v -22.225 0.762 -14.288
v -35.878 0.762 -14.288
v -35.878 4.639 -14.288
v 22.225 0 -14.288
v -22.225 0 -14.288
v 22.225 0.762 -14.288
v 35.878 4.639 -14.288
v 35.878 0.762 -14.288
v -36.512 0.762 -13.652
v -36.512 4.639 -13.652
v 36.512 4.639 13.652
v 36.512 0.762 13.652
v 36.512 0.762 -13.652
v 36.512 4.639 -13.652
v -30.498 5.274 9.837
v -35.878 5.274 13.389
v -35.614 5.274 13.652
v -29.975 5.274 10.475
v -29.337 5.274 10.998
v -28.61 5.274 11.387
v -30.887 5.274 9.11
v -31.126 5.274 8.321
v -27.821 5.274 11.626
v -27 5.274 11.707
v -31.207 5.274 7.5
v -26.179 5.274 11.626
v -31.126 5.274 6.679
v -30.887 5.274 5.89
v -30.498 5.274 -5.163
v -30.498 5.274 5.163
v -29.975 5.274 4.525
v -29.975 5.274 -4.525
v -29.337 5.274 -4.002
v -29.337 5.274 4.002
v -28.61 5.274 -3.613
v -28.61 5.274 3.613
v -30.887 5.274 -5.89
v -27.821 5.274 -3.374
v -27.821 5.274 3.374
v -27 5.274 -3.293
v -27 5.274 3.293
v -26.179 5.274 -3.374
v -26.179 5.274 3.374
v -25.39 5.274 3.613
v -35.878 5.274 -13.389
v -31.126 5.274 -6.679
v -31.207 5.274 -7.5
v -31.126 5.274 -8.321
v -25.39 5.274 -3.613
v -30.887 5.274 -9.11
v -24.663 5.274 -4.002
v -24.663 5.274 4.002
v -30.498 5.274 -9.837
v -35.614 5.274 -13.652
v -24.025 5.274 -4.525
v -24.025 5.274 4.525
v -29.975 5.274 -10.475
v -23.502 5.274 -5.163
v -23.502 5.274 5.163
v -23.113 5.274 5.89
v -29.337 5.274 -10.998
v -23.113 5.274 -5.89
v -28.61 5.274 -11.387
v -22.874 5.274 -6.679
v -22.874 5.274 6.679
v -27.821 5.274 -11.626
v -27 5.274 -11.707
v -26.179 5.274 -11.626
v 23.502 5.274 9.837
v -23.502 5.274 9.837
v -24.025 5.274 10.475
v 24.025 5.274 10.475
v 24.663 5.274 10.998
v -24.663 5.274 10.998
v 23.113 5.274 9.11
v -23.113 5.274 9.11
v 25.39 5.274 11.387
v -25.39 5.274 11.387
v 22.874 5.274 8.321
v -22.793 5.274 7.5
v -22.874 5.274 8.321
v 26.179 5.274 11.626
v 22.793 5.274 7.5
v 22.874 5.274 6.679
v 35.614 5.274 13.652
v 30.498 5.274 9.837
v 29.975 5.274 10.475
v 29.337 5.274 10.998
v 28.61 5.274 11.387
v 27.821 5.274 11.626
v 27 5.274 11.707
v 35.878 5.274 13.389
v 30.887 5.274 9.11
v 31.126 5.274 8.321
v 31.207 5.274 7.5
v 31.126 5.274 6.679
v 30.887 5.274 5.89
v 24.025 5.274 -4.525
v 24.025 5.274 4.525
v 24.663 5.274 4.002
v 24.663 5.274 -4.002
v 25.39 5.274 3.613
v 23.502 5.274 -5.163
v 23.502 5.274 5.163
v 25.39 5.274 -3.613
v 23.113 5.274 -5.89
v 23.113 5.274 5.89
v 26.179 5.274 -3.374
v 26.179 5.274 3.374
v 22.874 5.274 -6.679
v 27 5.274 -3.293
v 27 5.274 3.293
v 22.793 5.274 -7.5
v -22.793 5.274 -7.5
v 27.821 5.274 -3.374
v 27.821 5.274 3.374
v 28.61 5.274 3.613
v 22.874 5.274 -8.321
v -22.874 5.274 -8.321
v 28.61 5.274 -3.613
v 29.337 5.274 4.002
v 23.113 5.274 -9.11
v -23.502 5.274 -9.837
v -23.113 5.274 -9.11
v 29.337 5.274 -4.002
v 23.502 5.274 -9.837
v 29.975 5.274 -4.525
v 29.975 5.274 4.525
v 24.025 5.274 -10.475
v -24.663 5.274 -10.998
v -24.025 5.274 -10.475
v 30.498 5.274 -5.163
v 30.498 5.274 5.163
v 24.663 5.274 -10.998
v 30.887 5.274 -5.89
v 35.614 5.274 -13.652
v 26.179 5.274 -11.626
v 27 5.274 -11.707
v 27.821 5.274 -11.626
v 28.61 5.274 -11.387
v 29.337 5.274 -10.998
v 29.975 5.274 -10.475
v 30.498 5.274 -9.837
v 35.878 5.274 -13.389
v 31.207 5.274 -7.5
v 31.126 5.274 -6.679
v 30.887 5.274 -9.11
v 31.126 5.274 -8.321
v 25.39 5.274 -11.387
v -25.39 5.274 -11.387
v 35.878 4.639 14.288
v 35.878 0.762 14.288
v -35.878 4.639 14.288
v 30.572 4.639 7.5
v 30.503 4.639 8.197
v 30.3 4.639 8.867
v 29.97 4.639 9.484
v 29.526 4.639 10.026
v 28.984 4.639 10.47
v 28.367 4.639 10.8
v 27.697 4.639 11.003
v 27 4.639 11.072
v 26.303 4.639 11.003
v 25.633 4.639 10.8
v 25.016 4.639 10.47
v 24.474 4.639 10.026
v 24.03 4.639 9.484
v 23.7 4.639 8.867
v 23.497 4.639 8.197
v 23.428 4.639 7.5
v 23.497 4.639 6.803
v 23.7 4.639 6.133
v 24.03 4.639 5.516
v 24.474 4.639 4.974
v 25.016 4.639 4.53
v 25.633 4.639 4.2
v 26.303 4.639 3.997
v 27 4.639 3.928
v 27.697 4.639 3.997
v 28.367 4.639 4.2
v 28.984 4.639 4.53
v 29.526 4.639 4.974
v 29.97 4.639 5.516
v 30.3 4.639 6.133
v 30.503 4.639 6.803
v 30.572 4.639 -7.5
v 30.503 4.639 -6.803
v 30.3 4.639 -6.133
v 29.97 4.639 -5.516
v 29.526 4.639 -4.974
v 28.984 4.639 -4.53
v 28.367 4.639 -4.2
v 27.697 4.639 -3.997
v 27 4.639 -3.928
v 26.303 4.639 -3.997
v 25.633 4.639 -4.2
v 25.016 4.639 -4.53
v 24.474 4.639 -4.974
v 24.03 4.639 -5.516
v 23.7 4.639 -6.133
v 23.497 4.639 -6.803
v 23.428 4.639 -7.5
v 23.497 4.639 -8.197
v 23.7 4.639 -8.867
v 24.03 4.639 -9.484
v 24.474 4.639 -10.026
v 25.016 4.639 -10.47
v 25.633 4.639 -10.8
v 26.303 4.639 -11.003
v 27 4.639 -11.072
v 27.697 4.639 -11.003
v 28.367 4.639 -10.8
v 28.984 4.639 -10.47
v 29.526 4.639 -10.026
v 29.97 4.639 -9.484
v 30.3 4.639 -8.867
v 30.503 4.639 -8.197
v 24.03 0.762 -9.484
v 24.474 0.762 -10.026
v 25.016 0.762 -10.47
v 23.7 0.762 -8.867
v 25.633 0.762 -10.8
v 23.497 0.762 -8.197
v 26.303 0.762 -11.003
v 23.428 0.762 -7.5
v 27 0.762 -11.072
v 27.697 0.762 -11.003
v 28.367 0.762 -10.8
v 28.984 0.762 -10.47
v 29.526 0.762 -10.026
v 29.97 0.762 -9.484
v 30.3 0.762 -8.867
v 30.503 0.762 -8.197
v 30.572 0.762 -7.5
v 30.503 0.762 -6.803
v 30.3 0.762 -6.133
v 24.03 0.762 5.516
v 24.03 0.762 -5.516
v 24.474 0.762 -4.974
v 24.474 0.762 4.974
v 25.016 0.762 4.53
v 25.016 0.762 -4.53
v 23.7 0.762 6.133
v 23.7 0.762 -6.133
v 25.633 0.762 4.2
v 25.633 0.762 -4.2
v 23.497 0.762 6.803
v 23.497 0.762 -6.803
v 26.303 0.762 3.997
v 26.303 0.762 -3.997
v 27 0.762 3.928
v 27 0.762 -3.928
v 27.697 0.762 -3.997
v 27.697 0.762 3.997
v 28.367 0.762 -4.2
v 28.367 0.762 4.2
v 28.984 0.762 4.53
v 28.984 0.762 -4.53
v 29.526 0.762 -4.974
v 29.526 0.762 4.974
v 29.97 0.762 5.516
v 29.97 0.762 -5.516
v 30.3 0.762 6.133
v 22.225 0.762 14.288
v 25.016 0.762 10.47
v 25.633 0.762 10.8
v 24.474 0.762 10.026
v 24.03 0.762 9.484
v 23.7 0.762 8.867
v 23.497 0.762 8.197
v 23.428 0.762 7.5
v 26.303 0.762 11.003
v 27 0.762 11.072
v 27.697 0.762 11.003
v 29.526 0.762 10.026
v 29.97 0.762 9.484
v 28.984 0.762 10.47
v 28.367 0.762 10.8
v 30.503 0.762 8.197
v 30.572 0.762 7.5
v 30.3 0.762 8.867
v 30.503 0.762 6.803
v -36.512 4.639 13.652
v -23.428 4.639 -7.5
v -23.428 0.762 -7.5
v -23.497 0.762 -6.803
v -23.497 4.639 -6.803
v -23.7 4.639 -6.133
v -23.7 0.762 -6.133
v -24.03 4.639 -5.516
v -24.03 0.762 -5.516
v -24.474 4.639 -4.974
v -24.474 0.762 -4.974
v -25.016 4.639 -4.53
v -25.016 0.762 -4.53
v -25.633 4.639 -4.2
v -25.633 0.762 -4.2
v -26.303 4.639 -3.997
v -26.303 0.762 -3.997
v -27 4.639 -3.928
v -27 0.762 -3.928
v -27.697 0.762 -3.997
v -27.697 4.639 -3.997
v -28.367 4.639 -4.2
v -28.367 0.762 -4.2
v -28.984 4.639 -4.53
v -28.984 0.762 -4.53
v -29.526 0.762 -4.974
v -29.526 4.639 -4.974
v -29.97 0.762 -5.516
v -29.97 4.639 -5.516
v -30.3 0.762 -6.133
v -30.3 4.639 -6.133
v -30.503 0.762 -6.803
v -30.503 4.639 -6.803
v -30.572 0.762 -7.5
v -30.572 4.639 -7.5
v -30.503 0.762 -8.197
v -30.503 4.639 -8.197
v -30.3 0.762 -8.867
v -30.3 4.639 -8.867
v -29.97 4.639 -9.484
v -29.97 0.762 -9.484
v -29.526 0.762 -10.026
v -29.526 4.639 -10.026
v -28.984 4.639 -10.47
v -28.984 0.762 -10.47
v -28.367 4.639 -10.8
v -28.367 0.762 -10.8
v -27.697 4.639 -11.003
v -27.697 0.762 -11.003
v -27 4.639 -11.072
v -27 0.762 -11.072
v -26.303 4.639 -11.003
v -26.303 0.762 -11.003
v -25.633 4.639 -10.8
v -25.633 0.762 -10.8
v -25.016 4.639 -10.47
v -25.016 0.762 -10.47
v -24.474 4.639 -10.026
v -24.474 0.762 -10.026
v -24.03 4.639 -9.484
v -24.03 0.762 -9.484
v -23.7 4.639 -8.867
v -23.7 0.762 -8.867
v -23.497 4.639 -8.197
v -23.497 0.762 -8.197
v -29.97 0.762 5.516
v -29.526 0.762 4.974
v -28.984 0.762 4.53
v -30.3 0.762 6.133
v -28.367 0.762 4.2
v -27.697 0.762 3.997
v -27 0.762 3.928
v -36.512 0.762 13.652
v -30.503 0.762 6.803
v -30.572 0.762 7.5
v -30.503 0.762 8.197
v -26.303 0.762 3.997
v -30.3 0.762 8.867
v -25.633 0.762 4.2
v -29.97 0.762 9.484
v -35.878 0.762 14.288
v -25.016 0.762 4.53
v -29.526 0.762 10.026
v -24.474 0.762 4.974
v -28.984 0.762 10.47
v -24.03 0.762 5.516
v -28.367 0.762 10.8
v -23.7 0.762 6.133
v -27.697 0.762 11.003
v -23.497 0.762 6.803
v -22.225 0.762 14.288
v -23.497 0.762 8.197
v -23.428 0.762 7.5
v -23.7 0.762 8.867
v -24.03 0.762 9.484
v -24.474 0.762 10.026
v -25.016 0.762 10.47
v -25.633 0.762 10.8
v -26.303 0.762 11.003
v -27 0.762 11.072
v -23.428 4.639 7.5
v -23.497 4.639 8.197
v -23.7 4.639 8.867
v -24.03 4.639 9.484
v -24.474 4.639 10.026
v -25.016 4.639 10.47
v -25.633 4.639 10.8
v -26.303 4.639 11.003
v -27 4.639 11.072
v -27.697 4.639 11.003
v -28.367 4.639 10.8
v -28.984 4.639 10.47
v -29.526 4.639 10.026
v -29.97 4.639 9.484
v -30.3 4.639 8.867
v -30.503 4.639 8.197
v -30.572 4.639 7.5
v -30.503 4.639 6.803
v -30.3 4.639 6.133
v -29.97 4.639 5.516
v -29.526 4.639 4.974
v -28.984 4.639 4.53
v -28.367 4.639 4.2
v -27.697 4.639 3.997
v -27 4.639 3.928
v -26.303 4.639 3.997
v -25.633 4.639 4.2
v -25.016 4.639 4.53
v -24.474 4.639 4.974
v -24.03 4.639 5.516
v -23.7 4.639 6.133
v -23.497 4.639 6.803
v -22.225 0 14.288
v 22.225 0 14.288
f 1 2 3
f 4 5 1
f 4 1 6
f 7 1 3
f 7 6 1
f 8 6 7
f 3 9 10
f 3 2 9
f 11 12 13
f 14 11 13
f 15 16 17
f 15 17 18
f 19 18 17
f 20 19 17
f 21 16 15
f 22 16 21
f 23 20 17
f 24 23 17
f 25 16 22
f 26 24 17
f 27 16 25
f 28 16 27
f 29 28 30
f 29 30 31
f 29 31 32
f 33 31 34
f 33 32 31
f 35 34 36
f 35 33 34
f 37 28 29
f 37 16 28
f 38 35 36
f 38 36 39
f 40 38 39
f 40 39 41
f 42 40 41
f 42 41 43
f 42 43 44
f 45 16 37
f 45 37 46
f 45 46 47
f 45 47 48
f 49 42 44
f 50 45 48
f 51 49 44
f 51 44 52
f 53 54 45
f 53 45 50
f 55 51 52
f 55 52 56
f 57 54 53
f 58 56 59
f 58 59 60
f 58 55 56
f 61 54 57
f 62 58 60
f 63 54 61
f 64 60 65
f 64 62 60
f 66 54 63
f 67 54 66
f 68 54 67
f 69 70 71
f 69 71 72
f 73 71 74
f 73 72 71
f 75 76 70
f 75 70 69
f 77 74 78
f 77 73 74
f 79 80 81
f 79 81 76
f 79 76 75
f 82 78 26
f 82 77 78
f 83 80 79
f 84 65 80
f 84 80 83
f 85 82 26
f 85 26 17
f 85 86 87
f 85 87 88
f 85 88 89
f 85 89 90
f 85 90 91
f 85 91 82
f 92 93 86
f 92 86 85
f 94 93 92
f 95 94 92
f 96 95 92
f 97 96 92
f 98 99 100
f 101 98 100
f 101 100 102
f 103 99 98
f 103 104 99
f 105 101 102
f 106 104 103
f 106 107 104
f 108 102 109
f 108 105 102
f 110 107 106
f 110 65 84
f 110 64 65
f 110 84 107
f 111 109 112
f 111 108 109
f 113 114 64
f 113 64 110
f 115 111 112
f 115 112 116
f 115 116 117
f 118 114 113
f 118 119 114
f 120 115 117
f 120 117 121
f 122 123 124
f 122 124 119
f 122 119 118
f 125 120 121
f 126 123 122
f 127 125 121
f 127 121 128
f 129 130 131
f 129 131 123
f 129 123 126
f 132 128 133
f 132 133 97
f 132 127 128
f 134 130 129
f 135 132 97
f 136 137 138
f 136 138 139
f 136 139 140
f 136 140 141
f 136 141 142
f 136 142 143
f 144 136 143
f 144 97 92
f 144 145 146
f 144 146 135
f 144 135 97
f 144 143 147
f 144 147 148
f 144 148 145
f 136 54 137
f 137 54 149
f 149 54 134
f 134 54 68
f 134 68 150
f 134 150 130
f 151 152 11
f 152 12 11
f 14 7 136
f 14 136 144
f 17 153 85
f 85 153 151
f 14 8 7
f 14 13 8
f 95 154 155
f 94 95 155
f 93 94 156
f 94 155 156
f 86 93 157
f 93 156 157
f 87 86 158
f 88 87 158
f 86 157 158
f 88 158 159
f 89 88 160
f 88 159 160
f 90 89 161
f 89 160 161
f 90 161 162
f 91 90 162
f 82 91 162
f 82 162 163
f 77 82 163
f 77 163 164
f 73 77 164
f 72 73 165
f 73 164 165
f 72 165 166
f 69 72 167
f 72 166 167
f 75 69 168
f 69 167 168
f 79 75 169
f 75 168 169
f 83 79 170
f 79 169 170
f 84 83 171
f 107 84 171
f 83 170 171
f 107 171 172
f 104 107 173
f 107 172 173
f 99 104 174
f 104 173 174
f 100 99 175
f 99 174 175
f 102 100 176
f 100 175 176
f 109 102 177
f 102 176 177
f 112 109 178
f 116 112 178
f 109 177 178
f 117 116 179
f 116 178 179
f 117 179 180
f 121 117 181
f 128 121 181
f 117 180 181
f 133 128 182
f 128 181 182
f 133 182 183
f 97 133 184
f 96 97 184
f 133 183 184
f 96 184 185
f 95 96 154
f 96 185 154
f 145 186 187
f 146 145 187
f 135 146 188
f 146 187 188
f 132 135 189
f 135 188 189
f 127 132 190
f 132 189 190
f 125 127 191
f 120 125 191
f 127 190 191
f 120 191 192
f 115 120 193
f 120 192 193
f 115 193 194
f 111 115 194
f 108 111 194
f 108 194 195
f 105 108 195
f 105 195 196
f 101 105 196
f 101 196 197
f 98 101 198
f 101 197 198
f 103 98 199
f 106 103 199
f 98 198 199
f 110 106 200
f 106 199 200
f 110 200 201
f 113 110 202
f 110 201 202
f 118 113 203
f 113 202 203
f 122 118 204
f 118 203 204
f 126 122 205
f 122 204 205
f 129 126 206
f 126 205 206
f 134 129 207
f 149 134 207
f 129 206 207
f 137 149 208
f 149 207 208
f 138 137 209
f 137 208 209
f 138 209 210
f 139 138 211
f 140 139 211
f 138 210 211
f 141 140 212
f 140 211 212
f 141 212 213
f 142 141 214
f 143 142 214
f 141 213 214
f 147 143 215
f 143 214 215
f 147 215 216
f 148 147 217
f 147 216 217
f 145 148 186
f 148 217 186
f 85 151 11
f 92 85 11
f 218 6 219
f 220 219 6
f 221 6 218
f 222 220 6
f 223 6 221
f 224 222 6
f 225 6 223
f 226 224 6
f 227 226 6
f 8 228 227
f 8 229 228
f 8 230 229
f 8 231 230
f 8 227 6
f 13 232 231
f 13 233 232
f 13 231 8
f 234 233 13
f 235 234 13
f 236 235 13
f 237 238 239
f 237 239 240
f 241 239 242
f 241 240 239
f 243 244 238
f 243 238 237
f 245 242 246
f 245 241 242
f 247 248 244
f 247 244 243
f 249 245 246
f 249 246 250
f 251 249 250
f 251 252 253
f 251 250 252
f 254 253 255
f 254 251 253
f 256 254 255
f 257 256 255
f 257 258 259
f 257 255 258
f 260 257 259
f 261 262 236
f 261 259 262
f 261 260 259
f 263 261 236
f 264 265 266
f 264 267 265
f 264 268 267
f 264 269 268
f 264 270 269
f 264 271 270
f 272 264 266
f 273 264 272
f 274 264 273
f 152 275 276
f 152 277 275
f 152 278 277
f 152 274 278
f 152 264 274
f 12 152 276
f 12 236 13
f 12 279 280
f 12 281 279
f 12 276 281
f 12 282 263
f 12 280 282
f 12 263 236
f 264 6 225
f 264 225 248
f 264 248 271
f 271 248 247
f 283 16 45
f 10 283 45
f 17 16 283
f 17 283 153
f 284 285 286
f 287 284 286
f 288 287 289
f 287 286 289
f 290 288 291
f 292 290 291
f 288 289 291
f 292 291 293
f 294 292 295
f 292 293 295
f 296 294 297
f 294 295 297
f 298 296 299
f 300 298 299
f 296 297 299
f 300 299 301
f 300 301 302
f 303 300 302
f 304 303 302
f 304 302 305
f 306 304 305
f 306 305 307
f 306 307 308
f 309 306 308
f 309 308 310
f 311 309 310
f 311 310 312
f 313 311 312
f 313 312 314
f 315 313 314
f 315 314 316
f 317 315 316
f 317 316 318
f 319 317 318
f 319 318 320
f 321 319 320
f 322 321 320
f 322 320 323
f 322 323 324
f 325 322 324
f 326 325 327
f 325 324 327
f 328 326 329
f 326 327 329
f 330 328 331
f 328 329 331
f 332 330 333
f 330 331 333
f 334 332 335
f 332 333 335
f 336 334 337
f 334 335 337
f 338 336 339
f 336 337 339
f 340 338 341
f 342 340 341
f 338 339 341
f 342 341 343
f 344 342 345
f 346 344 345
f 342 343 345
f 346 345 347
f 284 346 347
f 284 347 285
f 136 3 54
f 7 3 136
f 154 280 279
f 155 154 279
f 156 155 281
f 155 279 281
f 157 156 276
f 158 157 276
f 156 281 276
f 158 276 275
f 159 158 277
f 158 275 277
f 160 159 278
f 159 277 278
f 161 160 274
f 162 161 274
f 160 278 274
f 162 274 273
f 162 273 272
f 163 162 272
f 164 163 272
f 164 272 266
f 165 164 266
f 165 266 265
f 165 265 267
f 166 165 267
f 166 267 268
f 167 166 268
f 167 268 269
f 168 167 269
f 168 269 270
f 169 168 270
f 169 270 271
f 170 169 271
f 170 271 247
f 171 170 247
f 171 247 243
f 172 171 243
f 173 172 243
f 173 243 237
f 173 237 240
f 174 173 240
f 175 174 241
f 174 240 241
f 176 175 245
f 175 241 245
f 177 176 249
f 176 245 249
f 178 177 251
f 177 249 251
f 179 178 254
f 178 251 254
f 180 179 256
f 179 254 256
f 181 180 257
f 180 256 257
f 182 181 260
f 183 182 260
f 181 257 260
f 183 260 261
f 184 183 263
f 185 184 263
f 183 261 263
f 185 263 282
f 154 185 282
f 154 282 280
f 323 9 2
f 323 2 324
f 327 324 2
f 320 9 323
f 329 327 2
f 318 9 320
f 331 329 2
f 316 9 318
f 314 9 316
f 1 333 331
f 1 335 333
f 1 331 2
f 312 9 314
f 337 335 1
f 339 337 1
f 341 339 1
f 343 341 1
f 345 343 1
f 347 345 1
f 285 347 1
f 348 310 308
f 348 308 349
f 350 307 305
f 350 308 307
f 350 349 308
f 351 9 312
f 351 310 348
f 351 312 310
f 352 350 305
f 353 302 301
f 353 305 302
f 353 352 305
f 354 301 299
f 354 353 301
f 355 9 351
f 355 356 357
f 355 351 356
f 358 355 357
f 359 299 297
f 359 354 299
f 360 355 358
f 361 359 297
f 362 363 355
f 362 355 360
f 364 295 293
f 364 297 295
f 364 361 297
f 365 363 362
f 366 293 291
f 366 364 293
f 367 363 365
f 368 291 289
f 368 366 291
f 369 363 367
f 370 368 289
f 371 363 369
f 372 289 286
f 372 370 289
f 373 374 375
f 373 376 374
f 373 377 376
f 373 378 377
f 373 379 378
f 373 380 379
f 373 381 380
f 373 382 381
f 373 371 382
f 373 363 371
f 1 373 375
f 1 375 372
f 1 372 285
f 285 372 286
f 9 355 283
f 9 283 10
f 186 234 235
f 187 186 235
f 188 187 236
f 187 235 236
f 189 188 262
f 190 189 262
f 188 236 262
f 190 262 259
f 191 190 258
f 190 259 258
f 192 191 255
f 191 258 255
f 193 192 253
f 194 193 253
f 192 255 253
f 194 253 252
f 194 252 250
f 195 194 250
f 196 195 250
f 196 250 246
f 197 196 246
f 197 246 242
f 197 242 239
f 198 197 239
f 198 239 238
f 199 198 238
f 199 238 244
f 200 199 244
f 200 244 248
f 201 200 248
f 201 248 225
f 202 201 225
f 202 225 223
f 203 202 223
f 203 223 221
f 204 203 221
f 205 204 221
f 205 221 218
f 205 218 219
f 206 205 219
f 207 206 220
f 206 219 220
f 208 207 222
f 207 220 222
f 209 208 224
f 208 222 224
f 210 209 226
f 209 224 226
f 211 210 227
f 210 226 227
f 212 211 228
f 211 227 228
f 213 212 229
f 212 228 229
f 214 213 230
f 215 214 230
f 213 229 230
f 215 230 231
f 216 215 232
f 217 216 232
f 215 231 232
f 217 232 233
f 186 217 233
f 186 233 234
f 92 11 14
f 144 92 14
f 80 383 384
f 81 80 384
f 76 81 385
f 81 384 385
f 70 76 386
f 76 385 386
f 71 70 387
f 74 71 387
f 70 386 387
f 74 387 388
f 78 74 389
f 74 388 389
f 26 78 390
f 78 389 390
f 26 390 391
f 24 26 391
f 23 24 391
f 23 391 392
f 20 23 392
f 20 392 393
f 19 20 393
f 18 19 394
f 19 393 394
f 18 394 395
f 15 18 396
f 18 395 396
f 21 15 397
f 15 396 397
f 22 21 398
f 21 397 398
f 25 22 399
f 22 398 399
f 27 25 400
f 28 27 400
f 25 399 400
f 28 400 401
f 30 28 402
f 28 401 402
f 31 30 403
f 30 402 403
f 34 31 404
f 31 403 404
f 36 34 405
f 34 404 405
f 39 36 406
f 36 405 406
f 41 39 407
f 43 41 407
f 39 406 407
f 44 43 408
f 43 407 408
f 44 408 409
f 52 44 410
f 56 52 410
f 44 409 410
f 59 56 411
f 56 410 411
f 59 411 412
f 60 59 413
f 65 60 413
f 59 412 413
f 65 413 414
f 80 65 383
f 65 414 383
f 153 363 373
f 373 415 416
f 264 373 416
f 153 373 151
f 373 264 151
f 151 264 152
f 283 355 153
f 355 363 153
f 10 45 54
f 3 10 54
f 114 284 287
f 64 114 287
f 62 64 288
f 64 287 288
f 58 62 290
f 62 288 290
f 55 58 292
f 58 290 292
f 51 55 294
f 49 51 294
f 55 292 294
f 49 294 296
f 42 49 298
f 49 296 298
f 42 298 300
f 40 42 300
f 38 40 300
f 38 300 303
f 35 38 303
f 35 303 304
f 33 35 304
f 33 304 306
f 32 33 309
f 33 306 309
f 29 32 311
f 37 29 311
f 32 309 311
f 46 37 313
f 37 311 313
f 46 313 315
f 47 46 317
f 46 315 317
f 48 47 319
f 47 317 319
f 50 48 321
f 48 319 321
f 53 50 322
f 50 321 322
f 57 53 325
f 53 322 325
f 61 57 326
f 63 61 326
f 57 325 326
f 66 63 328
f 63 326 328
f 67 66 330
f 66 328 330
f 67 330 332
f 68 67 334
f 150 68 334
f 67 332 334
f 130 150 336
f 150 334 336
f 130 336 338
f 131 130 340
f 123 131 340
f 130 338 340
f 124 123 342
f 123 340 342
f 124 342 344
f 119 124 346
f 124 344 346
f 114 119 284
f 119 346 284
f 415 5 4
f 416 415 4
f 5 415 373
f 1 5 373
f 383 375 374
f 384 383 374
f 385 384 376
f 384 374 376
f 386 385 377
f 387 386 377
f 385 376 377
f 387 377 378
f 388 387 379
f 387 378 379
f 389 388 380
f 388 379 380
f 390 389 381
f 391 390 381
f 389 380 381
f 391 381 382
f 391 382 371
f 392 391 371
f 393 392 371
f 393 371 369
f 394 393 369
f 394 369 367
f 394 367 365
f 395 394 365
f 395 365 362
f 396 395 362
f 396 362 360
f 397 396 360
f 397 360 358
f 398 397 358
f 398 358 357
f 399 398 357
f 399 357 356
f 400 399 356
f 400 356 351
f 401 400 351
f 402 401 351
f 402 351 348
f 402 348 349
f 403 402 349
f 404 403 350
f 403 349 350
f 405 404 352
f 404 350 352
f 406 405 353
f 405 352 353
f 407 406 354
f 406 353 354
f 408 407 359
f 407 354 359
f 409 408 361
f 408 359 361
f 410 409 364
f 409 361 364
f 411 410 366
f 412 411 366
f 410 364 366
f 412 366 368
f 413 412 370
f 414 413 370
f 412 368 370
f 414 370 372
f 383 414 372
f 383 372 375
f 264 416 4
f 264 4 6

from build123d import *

# Parameters (mm, degrees)
SKETCH1_W                       = 73.025
SKETCH1_H                       = 28.575
BOSS_EXTRUDE1_DEPTH             = 5.2740052
SKETCH2_W                       = 14.2875
SKETCH2_H                       = 0.762
CUT_EXTRUDE1_DEPTH              = 47.663780517
F_9_32_0_28125_DIAMETER_HOLE1_D = 7.14375
CHAMFER1_SIZE                   = 0.635
CHAMFER2_SIZE                   = 0.635


with BuildPart() as part:
    # Sketch1 → Boss-Extrude1 (new body)
    with BuildSketch(Plane(origin=(0, 0, 0), x_dir=(1, 0, 0), z_dir=(0, 1, 0))):
        Rectangle(SKETCH1_W, SKETCH1_H)
    extrude(amount=BOSS_EXTRUDE1_DEPTH)

    # Sketch2 → Cut-Extrude1 (cut, through all)
    with BuildSketch(Plane.XY.offset(14.2875)):
        with Locations((-29.36875, 0.381)):
            Rectangle(SKETCH2_W, SKETCH2_H)
        with Locations((29.36875, 0.381)):
            Rectangle(SKETCH2_W, SKETCH2_H)
    extrude(amount=-CUT_EXTRUDE1_DEPTH, mode=Mode.SUBTRACT)

    # 9/32 (0.28125) Diameter Hole1 (through all)
    with Locations(Plane(origin=(0, 5.2740052, 0), x_dir=(-1, 0, 0), z_dir=(0, 1, 0))):
        with Locations((27, -7.5), (-27, 7.5), (-27, -7.5), (27, 7.5)):
            Hole(F_9_32_0_28125_DIAMETER_HOLE1_D / 2)

    # Chamfer1
    chamfer1_edges = [part.edges().sort_by_distance(p)[0] for p in [
        (36.5125, 3.0180026, 14.2875),
        (-36.5125, 3.0180026, 14.2875),
        (-36.5125, 3.0180026, -14.2875),
        (36.5125, 3.0180026, -14.2875),
    ]]
    chamfer(chamfer1_edges, length=CHAMFER1_SIZE)

    # Chamfer2
    chamfer2_edges = [part.edges().sort_by_distance(p)[0] for p in [
        (-30.571875, 5.2740052, 7.5),
        (23.428125, 5.2740052, -7.5),
        (23.428125, 5.2740052, 7.5),
        (-30.571875, 5.2740052, -7.5),
        (36.5125, 5.2740052, 0),
        (0, 5.2740052, 14.2875),
        (0, 5.2740052, -14.2875),
        (-36.5125, 5.2740052, 0),
        (-36.195, 5.2740052, 13.97),
        (-36.195, 5.2740052, -13.97),
        (36.195, 5.2740052, -13.97),
        (36.195, 5.2740052, 13.97),
    ]]
    chamfer(chamfer2_edges, length=CHAMFER2_SIZE)


solid = part.part
